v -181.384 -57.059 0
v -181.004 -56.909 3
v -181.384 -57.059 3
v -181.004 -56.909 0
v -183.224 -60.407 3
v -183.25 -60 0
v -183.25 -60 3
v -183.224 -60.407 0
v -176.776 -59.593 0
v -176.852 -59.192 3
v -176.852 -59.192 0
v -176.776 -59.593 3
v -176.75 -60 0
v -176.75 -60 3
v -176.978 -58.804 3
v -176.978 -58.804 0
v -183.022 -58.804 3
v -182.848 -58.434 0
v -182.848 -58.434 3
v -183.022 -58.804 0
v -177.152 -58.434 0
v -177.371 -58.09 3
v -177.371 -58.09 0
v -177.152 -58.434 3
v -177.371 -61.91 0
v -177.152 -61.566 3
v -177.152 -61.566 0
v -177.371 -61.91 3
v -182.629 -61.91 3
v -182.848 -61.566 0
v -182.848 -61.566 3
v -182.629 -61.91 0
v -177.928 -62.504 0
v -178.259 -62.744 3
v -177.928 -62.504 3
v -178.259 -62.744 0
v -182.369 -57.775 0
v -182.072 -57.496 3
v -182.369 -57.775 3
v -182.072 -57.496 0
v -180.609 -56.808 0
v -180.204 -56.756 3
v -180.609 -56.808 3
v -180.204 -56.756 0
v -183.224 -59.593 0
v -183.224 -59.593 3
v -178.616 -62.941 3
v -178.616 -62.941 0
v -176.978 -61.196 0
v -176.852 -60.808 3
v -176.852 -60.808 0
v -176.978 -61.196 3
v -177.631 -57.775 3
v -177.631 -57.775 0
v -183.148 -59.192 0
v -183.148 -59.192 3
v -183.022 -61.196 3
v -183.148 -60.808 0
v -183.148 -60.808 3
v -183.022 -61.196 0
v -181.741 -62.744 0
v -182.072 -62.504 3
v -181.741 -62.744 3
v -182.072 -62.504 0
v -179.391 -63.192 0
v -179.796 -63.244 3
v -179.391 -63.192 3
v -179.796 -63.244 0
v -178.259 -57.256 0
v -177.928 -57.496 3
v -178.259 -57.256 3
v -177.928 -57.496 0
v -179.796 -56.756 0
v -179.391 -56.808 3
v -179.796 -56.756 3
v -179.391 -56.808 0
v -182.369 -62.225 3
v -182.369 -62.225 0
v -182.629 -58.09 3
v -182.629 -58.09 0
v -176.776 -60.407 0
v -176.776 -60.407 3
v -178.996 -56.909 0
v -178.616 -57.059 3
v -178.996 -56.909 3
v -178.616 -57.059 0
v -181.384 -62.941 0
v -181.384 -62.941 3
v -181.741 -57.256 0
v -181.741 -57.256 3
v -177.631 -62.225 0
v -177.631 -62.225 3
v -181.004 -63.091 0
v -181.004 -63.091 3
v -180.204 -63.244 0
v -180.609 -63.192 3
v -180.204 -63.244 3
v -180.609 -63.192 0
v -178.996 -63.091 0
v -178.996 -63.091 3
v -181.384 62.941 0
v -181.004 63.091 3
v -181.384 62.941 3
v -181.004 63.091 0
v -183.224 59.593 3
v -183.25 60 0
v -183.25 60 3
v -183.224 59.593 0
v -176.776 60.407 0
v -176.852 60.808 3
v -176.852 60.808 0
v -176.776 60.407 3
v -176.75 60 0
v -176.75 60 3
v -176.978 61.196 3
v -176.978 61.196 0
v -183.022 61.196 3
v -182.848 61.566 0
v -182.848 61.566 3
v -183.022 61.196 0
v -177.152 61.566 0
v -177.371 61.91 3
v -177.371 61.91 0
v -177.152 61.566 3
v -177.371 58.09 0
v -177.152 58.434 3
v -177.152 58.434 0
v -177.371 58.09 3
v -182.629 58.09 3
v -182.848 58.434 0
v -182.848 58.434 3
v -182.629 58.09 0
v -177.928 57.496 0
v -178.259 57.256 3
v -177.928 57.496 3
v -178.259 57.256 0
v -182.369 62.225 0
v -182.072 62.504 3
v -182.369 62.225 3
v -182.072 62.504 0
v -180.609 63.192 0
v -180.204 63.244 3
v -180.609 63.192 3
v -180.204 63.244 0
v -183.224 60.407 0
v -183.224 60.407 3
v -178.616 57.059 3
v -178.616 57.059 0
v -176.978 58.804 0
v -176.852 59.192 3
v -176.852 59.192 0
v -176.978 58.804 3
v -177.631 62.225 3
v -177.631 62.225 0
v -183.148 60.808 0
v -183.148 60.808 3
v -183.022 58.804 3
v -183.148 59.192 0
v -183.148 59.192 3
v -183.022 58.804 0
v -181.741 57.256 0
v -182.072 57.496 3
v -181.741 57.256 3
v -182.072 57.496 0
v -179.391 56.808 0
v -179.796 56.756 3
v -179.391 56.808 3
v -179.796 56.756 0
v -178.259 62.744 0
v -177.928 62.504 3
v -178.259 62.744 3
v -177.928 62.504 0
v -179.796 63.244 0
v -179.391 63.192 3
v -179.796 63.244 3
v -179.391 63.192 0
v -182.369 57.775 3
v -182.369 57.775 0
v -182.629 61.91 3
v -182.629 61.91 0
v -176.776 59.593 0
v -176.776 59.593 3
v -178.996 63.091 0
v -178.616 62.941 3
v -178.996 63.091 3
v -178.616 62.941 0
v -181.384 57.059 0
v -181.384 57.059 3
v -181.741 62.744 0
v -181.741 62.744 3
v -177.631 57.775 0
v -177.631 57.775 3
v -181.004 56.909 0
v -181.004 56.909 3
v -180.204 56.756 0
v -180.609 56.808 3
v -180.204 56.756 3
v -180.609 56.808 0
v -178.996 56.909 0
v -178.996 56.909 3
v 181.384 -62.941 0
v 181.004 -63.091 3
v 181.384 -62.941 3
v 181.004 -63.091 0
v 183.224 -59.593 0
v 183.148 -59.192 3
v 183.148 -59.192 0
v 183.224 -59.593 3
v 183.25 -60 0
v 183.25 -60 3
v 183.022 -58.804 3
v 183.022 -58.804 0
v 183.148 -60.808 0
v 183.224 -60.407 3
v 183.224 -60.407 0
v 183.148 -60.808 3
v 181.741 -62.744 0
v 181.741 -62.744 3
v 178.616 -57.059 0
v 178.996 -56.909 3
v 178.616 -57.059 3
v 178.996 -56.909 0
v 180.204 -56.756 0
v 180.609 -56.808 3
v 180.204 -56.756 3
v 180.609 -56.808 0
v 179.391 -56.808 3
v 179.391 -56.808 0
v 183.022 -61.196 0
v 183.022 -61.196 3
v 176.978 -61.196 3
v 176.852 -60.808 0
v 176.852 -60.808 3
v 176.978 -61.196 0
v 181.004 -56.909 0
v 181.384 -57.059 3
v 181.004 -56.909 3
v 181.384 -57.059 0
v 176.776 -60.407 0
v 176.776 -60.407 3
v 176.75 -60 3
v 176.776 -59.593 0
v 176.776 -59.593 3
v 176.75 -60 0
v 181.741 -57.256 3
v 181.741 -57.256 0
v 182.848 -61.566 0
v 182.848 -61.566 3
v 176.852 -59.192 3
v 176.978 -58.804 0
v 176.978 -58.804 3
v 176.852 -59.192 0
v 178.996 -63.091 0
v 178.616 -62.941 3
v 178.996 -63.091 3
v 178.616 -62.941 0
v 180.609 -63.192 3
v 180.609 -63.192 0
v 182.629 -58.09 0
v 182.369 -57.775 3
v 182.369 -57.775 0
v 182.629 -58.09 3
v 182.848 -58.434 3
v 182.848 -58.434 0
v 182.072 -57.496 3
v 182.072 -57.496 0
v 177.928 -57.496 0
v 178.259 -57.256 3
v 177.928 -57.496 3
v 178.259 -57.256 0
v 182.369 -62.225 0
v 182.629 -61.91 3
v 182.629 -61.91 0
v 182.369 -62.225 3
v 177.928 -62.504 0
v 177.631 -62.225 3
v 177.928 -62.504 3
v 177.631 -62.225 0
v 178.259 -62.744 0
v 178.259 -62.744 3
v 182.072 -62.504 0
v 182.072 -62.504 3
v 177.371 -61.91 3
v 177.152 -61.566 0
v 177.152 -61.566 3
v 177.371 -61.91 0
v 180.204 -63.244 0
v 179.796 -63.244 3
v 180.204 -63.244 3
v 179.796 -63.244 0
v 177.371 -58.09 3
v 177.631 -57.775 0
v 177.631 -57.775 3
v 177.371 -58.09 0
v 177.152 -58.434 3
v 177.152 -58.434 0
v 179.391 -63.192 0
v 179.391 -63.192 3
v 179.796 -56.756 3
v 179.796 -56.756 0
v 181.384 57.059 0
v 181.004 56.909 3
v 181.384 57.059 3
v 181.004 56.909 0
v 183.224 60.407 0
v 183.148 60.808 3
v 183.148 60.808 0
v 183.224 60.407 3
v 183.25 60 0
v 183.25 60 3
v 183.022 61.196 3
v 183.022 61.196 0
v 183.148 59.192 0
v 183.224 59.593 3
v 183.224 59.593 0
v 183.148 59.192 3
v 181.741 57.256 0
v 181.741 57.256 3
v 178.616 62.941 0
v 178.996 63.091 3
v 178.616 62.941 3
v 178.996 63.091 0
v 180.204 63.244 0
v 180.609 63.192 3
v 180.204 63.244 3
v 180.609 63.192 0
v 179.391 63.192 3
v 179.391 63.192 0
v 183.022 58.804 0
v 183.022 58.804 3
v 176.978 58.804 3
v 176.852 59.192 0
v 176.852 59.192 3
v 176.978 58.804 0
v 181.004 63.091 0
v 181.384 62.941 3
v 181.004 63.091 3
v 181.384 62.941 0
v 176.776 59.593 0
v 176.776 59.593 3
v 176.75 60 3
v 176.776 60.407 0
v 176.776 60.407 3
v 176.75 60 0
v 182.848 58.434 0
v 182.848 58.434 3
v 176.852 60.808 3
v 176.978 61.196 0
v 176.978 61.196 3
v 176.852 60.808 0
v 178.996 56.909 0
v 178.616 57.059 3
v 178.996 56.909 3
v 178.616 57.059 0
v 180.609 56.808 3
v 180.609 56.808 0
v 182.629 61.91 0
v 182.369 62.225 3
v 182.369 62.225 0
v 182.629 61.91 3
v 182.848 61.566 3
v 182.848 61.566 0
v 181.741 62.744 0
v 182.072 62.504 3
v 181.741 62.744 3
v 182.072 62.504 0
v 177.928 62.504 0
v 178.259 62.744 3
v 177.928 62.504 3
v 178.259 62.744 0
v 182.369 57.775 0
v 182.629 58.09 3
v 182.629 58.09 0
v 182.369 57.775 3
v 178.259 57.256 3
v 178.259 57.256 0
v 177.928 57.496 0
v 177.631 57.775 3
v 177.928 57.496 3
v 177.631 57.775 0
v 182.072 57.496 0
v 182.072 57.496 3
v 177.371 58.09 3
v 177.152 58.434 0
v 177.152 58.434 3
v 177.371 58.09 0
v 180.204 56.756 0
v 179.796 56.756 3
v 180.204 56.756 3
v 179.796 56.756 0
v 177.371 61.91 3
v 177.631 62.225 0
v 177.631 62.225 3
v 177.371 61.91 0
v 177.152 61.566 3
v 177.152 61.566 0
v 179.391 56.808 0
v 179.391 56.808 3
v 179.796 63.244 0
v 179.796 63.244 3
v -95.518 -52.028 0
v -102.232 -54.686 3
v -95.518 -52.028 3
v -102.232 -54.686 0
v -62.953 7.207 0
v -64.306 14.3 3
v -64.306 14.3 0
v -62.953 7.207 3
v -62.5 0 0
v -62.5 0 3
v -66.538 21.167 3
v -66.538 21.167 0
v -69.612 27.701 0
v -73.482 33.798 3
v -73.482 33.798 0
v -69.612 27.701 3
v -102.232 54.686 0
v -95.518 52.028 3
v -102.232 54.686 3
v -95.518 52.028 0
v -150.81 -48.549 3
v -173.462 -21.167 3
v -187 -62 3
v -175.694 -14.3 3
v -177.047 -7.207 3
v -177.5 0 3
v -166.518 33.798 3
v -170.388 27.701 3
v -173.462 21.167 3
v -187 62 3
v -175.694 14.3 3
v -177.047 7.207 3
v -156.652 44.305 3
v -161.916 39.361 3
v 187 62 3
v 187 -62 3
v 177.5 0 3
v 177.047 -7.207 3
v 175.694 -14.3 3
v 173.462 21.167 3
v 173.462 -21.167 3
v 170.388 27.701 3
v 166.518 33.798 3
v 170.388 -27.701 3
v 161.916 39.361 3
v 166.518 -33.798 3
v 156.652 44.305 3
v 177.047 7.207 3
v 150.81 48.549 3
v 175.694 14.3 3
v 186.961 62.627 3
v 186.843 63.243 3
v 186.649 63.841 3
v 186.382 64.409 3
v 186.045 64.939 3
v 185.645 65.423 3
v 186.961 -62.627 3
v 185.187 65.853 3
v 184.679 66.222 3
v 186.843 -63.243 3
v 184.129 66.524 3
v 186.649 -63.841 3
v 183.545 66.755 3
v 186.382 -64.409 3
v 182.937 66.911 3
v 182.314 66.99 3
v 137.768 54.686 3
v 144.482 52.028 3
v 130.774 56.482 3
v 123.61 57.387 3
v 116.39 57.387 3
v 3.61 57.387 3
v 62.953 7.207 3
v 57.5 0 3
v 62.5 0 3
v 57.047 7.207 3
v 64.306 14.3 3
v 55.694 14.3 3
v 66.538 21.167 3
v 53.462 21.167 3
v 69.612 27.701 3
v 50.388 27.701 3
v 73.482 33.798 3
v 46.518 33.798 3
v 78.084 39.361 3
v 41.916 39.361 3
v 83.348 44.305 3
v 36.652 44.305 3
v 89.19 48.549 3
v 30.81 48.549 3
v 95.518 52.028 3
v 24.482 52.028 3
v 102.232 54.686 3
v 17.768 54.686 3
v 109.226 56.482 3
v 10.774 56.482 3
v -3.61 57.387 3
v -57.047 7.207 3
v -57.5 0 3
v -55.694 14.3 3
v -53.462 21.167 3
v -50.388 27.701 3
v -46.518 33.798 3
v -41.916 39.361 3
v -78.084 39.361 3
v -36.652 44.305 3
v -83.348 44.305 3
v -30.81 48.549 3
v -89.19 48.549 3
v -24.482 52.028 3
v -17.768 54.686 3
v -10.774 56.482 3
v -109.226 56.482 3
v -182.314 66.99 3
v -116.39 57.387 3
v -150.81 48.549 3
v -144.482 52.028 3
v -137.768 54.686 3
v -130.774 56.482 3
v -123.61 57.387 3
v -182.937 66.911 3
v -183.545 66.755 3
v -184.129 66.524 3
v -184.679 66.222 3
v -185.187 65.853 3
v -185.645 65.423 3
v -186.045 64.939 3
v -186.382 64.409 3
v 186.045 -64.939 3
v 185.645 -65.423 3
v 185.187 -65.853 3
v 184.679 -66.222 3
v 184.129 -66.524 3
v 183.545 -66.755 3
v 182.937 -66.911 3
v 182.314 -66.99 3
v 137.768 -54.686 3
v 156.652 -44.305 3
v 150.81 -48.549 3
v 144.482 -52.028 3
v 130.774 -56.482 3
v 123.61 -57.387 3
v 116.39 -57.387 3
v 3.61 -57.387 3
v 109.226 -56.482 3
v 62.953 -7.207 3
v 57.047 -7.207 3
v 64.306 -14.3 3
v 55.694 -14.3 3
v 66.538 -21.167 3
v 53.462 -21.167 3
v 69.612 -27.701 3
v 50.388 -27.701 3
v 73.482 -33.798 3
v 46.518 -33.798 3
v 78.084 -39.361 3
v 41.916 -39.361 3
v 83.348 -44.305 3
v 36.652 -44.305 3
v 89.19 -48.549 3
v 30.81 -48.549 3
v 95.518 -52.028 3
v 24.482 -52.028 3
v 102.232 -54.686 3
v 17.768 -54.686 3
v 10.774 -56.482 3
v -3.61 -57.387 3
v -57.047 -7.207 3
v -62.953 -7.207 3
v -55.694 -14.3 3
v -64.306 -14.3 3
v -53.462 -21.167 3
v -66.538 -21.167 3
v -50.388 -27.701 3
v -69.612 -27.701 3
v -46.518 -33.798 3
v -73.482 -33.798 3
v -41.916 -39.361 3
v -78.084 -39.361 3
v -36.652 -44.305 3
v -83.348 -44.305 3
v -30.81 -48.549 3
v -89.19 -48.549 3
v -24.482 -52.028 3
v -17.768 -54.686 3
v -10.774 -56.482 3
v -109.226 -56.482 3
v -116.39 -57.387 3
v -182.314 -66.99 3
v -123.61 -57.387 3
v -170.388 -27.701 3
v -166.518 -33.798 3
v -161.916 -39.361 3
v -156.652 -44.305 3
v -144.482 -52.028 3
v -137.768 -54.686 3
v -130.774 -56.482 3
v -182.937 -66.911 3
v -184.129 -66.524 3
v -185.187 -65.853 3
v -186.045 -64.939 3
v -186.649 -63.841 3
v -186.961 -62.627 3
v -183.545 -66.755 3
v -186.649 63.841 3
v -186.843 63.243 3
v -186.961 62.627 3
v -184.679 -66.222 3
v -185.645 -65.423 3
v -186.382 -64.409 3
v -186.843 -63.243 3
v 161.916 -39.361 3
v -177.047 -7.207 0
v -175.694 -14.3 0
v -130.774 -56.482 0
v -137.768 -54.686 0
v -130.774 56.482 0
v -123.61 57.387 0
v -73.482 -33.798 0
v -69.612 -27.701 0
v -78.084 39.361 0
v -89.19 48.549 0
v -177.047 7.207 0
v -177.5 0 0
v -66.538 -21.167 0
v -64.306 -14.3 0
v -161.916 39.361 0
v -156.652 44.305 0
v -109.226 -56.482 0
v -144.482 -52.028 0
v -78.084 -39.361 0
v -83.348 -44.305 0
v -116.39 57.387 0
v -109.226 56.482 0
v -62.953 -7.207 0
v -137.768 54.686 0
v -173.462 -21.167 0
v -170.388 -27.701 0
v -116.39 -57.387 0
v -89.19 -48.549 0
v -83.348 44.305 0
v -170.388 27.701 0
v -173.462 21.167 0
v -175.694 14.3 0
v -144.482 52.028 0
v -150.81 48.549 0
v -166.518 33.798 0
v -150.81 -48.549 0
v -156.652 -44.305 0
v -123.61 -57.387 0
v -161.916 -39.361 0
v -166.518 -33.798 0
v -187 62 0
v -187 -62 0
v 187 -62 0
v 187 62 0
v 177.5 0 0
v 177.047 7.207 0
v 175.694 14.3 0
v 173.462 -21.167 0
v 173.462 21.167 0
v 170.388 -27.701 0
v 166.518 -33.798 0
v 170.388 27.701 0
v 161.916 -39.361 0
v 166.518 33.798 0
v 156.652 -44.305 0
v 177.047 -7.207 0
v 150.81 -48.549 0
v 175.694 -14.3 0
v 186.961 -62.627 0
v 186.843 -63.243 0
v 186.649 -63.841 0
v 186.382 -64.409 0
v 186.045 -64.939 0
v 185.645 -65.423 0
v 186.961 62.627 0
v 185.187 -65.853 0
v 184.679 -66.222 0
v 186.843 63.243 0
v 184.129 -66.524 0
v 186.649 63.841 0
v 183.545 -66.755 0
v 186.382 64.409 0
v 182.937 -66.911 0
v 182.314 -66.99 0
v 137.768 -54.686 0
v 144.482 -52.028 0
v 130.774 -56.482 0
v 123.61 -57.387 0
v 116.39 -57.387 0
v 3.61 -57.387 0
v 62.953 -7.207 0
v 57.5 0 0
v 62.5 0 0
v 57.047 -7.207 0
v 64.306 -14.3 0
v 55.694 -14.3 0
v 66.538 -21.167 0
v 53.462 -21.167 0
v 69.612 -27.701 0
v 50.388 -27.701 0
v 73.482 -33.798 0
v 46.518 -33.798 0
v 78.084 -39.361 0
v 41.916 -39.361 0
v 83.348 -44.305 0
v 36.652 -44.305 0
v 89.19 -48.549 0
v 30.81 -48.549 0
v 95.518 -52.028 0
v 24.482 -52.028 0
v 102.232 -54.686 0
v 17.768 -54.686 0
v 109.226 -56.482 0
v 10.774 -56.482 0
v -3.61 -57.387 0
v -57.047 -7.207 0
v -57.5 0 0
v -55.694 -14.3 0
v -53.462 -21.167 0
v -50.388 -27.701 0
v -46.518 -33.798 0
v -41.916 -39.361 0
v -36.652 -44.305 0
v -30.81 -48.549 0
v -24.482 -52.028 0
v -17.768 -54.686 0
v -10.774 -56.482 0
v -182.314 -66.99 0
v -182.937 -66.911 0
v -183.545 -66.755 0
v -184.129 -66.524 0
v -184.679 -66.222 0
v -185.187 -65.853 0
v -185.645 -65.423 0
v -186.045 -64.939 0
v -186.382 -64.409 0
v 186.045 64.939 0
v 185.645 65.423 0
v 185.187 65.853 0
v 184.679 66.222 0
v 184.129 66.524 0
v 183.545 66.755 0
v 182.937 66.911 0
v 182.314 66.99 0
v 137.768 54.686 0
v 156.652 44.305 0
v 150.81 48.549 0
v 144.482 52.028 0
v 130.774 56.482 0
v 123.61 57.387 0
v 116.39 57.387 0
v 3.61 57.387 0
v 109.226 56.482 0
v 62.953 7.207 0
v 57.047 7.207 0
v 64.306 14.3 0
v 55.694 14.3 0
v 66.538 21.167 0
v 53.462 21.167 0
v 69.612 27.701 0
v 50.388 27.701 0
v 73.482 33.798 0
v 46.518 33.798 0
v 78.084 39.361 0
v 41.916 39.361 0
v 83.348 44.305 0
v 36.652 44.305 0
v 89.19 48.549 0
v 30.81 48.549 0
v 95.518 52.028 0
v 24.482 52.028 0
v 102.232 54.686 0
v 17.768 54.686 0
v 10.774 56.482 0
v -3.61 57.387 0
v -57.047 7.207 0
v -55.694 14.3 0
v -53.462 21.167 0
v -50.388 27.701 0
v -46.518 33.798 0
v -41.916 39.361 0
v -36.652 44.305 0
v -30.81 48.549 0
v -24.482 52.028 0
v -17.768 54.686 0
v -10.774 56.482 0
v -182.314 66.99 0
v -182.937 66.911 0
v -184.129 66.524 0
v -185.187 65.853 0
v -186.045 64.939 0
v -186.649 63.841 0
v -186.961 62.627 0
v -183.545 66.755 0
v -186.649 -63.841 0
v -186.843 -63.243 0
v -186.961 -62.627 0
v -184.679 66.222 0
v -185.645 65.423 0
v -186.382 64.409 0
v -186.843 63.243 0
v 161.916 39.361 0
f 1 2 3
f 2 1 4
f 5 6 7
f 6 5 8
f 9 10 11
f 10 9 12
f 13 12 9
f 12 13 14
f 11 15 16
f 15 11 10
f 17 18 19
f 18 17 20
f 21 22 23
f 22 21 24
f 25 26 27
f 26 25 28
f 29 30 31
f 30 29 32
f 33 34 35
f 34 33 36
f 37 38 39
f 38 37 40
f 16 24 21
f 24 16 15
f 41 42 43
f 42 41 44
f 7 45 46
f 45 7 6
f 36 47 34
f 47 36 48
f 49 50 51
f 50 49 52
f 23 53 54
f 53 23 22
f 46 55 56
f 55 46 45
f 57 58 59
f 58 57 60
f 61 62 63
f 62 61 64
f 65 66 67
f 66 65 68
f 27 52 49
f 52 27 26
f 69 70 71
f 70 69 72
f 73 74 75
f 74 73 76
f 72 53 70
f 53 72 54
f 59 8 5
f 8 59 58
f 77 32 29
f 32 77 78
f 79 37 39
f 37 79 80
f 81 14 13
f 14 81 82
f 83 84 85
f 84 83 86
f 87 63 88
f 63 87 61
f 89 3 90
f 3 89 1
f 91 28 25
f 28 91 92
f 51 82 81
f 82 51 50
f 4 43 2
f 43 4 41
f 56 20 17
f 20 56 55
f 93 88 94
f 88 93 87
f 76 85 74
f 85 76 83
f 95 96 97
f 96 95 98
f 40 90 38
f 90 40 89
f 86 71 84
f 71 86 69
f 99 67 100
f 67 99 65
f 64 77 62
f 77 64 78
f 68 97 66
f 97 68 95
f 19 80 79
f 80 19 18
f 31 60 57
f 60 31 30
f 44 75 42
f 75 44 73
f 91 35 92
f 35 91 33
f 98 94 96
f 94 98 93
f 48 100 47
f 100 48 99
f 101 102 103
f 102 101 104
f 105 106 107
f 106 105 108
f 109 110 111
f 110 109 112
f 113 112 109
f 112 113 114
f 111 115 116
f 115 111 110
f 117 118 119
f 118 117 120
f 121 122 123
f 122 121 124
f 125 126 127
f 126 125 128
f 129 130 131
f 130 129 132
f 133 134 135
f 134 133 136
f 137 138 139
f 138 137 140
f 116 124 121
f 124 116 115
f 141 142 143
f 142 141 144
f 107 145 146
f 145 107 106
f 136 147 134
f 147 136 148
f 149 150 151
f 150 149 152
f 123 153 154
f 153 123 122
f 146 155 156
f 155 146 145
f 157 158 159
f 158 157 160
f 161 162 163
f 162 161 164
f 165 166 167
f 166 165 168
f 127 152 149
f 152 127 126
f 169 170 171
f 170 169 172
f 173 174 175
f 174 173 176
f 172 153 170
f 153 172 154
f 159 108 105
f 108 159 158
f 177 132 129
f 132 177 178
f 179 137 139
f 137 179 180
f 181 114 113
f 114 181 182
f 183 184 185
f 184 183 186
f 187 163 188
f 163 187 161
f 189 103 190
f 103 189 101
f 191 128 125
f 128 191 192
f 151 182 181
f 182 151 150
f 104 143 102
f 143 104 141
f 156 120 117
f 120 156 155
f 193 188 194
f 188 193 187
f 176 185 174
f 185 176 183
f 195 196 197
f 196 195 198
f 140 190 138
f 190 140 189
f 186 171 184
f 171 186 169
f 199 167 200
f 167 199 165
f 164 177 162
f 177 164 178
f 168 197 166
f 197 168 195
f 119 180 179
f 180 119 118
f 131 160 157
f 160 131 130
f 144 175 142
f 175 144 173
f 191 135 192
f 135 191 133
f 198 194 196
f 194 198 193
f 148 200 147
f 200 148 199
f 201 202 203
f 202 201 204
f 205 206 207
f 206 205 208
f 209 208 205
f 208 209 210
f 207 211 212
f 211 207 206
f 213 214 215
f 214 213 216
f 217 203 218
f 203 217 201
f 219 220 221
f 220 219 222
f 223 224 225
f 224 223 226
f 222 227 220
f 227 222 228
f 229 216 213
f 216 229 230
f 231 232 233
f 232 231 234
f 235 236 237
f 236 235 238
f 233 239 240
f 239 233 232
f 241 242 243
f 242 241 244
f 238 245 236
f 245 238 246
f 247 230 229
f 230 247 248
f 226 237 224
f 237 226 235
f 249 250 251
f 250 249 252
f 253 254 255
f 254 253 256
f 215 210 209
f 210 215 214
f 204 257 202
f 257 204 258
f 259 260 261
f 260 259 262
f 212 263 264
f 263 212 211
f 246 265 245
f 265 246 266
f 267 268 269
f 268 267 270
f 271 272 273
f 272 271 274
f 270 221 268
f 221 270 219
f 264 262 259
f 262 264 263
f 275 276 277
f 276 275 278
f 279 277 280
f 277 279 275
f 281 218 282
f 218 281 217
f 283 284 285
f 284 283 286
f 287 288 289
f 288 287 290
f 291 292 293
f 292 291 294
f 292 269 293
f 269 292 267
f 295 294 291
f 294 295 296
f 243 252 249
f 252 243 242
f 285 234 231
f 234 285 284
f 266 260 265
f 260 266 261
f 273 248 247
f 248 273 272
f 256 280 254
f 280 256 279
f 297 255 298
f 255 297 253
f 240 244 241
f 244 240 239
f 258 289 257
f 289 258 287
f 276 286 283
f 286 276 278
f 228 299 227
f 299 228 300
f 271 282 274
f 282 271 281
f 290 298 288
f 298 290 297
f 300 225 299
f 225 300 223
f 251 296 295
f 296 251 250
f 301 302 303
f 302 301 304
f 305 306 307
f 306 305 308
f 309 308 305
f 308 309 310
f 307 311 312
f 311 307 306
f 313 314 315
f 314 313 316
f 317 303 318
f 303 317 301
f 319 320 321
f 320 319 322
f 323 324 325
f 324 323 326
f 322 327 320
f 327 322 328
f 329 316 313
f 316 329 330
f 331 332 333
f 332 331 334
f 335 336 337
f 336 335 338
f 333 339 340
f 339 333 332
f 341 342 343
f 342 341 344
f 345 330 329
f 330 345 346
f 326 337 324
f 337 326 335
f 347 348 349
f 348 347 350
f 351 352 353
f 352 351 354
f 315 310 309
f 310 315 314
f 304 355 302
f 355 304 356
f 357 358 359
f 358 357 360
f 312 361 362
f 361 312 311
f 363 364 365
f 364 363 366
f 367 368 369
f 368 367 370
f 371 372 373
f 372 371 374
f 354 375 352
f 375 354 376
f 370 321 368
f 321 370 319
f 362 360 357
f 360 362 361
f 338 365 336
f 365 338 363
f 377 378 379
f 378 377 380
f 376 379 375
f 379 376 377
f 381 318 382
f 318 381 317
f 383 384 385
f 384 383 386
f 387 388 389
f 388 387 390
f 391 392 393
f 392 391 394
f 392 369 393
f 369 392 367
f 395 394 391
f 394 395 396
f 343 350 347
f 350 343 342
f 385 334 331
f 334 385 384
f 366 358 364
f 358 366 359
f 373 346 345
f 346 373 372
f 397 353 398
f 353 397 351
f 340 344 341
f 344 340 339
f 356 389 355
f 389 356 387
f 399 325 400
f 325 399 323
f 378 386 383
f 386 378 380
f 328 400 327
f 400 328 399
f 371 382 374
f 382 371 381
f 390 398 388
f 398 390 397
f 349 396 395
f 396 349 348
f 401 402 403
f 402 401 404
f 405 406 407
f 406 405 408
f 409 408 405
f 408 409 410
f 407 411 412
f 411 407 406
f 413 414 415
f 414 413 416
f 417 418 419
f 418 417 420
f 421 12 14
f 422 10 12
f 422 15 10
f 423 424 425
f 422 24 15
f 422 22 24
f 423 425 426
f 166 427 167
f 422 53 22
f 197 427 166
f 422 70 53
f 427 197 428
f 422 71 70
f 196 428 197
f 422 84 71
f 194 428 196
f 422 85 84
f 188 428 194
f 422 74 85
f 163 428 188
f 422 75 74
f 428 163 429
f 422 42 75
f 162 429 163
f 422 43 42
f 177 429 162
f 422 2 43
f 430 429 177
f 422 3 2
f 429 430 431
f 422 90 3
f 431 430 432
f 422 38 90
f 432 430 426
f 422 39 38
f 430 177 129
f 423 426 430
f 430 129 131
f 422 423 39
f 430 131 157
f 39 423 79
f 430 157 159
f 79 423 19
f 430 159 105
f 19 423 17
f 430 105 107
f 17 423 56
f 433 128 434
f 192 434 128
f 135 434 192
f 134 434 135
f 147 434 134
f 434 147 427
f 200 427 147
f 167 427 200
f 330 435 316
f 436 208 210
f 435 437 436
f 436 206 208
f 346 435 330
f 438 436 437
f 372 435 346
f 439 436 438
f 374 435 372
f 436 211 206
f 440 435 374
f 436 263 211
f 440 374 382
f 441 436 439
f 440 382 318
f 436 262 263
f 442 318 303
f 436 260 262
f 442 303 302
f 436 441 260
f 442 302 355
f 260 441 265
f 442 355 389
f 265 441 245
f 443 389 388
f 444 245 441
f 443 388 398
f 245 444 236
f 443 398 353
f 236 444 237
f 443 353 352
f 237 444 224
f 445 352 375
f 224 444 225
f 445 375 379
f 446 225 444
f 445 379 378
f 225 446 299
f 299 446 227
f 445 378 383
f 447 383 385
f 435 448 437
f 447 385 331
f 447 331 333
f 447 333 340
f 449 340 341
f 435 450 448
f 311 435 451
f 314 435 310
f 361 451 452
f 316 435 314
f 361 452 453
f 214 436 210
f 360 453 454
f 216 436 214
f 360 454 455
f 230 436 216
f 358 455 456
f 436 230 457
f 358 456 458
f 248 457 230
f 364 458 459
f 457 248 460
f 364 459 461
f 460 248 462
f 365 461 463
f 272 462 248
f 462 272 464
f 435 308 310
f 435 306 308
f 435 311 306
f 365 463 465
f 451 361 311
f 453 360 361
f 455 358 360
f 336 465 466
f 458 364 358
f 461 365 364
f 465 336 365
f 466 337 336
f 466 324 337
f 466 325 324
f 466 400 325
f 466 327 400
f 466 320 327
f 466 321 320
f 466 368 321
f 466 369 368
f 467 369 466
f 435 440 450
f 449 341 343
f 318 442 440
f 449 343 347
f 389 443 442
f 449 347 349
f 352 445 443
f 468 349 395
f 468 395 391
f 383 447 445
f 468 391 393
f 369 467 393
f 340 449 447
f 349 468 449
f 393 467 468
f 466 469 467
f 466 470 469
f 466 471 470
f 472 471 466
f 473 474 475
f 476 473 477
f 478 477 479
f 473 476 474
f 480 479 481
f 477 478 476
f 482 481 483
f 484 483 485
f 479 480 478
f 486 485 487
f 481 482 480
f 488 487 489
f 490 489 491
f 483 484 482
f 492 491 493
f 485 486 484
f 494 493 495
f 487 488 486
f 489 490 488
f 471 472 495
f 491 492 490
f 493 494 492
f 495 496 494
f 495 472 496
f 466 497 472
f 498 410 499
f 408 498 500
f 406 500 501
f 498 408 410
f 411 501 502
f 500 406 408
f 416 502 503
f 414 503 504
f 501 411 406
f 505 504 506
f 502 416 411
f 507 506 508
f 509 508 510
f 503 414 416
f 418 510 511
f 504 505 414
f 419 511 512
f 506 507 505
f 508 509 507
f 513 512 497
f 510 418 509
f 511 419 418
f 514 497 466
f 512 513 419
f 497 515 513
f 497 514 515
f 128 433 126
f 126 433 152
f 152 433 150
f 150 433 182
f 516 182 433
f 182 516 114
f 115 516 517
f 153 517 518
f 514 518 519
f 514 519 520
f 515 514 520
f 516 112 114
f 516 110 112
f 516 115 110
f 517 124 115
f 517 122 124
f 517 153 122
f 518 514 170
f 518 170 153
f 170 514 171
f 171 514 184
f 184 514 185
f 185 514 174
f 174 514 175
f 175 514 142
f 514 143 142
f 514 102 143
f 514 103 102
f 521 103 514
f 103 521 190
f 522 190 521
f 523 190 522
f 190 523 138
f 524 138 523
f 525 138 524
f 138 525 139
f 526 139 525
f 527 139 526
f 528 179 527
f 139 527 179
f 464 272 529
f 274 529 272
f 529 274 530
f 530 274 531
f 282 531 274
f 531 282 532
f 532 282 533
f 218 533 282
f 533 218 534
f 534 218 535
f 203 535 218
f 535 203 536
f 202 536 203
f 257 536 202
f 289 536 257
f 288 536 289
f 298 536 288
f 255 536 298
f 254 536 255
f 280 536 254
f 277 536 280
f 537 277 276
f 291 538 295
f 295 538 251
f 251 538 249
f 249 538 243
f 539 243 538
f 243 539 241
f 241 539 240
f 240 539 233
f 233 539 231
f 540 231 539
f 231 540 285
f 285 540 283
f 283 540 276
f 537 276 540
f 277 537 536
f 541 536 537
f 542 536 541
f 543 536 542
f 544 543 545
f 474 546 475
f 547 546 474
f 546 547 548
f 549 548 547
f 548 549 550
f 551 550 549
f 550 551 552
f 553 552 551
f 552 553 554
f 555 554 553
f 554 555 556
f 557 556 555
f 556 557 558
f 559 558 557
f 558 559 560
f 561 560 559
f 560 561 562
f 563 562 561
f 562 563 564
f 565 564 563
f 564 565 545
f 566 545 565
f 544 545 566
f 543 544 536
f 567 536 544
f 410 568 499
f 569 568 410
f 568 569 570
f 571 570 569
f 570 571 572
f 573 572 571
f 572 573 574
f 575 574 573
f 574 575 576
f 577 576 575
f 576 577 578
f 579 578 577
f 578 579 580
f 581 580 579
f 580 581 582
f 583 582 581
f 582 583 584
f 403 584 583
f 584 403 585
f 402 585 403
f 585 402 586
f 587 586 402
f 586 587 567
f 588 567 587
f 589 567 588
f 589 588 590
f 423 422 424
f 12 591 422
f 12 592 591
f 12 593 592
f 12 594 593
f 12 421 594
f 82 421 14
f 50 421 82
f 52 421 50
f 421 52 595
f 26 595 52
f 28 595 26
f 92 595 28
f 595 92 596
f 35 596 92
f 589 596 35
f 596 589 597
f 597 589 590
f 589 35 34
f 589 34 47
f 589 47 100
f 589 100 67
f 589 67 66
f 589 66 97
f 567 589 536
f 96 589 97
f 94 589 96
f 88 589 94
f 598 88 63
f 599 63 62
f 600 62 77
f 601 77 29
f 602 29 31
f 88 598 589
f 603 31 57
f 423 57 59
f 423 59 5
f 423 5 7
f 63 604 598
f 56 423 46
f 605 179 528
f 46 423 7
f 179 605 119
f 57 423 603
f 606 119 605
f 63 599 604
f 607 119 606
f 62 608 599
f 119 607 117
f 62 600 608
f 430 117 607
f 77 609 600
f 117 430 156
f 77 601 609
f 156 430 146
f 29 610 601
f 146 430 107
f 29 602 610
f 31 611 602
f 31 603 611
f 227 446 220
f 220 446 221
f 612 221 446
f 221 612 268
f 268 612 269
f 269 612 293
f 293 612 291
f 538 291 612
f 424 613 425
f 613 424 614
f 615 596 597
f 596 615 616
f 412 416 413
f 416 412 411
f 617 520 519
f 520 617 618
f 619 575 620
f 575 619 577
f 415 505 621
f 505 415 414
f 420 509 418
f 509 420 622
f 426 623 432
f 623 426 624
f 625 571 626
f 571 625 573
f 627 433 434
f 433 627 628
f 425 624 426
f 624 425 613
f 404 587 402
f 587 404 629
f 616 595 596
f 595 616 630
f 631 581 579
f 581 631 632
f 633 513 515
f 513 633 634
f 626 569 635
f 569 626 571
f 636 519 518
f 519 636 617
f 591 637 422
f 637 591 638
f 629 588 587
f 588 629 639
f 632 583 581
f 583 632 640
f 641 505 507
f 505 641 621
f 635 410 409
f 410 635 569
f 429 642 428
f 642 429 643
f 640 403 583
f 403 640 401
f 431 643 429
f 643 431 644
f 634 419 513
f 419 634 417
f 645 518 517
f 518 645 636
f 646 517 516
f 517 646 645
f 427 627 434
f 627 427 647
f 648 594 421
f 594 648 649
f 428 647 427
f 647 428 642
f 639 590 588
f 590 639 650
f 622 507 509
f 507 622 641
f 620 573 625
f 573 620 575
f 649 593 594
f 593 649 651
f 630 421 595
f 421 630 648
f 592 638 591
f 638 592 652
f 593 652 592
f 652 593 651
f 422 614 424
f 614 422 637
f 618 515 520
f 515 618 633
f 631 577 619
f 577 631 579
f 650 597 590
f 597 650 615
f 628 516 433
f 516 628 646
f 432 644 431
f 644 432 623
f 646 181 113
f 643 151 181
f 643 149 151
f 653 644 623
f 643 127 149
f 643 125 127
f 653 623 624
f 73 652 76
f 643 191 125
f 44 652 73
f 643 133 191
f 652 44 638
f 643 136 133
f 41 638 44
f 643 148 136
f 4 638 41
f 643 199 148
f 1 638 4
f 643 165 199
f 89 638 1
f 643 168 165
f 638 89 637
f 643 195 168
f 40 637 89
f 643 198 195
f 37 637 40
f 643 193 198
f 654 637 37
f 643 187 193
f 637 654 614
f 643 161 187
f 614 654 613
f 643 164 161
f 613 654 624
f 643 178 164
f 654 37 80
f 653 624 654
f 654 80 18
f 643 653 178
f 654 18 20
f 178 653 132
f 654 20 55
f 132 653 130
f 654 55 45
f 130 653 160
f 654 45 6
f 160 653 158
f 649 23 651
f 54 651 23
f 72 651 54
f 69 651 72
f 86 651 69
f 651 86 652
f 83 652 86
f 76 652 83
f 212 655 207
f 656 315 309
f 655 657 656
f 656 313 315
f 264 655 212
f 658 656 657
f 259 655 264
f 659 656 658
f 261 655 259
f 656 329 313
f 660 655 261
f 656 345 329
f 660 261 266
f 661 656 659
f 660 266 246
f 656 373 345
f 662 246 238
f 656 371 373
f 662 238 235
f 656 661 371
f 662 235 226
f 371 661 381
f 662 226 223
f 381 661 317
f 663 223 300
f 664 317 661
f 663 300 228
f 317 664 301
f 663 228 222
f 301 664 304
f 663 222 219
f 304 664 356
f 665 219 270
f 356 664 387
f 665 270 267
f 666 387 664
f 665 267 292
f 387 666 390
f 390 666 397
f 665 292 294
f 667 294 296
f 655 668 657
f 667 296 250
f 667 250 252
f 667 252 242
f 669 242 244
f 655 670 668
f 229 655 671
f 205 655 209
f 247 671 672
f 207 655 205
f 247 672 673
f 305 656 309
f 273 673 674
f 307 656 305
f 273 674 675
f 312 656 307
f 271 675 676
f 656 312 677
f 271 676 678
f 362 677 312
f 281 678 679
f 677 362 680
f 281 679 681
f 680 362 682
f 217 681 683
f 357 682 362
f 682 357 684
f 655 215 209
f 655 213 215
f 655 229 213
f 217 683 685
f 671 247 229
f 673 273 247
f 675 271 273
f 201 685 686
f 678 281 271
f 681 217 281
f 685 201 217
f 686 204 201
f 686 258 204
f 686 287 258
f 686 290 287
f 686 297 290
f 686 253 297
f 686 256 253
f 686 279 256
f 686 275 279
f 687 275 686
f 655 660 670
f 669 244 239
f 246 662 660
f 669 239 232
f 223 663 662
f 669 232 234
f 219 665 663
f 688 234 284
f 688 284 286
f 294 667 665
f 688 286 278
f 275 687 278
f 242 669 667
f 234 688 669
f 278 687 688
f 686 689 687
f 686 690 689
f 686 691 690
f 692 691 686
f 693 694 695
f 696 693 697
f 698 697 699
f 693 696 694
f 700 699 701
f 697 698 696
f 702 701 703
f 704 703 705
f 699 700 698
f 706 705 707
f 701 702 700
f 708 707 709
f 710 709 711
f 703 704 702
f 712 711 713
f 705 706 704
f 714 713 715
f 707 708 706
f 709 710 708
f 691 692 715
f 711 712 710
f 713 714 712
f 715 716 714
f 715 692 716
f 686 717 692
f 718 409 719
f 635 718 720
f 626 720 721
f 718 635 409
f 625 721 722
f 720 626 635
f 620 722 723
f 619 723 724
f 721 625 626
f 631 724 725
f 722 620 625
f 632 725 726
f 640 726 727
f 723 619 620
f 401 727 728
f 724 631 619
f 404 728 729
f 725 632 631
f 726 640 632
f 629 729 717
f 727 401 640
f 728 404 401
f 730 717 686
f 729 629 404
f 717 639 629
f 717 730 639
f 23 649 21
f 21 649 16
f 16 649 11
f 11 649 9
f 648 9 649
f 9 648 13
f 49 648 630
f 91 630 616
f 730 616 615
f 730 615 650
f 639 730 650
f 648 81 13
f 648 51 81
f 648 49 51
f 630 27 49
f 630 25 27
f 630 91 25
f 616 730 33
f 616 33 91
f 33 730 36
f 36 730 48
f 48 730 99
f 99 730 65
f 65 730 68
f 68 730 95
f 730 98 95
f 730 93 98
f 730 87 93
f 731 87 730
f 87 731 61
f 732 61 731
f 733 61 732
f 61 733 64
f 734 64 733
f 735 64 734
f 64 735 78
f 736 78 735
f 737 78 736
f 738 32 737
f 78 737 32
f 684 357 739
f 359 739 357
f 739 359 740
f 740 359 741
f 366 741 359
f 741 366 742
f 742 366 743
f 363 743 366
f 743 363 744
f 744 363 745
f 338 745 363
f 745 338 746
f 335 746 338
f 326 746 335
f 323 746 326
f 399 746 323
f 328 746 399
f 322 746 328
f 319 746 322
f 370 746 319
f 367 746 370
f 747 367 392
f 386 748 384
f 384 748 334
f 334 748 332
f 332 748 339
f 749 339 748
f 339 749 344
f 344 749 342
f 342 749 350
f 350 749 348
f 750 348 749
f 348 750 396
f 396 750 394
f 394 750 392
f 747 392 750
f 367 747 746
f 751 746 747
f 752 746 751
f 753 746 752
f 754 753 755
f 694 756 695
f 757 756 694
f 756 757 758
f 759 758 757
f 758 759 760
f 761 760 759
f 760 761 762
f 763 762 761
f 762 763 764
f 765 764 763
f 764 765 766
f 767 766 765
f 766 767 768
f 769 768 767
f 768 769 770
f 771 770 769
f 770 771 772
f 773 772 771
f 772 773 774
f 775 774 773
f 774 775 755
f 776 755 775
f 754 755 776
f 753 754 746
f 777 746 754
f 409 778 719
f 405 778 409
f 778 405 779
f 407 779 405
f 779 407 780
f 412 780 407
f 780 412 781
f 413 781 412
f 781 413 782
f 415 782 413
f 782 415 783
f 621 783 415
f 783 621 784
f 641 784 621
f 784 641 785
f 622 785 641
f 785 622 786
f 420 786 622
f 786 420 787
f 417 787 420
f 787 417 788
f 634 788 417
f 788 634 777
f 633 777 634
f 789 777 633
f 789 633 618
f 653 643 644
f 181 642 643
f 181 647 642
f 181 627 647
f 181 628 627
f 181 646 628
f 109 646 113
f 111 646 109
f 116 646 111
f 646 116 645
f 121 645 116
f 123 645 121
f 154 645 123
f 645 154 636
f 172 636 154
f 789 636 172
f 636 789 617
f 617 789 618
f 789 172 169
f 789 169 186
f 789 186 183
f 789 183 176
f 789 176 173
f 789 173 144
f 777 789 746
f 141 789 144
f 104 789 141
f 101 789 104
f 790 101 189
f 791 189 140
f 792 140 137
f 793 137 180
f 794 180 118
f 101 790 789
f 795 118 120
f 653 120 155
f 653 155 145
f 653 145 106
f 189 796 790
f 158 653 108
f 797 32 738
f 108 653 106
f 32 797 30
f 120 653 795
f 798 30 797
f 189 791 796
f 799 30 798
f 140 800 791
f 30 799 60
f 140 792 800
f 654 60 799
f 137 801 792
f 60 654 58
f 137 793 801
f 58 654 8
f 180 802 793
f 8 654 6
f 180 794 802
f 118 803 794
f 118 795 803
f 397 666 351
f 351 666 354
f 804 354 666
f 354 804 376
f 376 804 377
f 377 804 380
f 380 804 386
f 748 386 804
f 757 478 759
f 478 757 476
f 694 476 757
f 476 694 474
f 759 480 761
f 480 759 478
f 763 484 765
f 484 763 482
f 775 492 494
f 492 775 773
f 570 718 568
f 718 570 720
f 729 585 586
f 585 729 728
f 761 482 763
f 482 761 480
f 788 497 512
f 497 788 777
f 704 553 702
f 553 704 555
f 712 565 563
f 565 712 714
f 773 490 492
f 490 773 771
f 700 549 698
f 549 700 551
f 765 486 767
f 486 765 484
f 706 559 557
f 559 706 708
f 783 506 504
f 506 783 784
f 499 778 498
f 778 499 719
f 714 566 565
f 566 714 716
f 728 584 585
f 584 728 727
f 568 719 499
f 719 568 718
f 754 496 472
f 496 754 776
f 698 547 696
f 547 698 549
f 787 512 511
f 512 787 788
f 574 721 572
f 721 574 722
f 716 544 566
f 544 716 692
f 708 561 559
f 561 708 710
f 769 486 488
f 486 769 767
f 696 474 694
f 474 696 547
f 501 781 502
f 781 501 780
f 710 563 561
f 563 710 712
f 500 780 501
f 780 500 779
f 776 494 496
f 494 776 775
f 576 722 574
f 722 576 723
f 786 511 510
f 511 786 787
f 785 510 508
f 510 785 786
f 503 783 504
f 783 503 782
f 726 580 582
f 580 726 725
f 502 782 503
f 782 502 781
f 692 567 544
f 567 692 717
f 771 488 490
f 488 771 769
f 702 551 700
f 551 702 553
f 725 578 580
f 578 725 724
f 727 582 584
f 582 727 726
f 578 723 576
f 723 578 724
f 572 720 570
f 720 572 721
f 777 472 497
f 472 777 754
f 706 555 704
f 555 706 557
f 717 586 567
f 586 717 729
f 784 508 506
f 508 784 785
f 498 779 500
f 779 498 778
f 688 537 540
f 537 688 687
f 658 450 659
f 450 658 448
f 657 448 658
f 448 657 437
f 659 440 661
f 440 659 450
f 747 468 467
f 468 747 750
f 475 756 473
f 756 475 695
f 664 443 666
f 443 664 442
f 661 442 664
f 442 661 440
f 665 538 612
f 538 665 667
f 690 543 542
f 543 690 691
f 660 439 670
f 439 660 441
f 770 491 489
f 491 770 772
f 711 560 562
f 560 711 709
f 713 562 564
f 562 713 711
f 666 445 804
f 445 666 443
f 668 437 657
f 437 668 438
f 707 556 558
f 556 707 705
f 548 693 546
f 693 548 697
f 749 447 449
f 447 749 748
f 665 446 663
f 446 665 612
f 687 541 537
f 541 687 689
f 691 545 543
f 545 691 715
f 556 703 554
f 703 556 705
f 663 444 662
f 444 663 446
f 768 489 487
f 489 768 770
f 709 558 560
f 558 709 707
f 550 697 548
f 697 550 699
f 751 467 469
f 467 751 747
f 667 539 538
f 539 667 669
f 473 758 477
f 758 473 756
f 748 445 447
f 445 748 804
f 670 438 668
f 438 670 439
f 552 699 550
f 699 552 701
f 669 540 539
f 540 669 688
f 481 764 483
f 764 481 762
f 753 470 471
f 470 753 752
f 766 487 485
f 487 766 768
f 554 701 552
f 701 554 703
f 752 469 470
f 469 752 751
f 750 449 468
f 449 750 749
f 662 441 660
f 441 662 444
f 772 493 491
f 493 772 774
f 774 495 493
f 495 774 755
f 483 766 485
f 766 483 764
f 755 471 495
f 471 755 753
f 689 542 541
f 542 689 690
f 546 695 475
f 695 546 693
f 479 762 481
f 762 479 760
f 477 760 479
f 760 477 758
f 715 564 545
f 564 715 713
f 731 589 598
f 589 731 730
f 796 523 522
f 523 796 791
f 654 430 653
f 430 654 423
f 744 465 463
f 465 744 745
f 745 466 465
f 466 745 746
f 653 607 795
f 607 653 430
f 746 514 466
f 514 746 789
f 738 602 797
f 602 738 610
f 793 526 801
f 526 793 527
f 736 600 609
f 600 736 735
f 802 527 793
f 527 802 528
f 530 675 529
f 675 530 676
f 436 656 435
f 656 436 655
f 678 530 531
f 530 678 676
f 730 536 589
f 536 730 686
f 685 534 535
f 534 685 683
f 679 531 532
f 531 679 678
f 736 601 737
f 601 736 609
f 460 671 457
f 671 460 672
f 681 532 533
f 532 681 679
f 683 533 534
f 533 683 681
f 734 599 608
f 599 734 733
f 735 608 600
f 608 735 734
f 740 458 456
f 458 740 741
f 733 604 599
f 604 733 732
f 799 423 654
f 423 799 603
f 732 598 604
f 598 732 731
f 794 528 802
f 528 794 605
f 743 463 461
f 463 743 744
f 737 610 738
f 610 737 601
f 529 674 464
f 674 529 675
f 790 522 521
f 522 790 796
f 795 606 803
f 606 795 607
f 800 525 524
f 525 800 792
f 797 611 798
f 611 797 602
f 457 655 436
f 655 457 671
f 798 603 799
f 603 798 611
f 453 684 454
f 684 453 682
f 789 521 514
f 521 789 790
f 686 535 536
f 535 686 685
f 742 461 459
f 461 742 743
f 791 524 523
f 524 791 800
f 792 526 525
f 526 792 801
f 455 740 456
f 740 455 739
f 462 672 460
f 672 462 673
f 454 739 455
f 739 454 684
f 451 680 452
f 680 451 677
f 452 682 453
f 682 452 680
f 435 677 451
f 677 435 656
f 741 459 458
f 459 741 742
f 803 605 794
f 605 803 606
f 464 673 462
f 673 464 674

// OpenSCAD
$fn = 50;


difference() {
	union() {
		hull() {
			translate(v = [-182.0000000000, 62.0000000000, 0]) {
				cylinder(h = 3, r = 5);
			}
			translate(v = [182.0000000000, 62.0000000000, 0]) {
				cylinder(h = 3, r = 5);
			}
			translate(v = [-182.0000000000, -62.0000000000, 0]) {
				cylinder(h = 3, r = 5);
			}
			translate(v = [182.0000000000, -62.0000000000, 0]) {
				cylinder(h = 3, r = 5);
			}
		}
	}
	union() {
		#translate(v = [-180.0000000000, -60.0000000000, -100.0000000000]) {
			cylinder(h = 200, r = 3.2500000000);
		}
		#translate(v = [-180.0000000000, 60.0000000000, -100.0000000000]) {
			cylinder(h = 200, r = 3.2500000000);
		}
		#translate(v = [180.0000000000, -60.0000000000, -100.0000000000]) {
			cylinder(h = 200, r = 3.2500000000);
		}
		#translate(v = [180.0000000000, 60.0000000000, -100.0000000000]) {
			cylinder(h = 200, r = 3.2500000000);
		}
		#translate(v = [-120.0000000000, 0, 0]) {
			cylinder(h = 3, r = 57.5000000000);
		}
		#cylinder(h = 3, r = 57.5000000000);
		#translate(v = [120.0000000000, 0, 0]) {
			cylinder(h = 3, r = 57.5000000000);
		}
	}
}
